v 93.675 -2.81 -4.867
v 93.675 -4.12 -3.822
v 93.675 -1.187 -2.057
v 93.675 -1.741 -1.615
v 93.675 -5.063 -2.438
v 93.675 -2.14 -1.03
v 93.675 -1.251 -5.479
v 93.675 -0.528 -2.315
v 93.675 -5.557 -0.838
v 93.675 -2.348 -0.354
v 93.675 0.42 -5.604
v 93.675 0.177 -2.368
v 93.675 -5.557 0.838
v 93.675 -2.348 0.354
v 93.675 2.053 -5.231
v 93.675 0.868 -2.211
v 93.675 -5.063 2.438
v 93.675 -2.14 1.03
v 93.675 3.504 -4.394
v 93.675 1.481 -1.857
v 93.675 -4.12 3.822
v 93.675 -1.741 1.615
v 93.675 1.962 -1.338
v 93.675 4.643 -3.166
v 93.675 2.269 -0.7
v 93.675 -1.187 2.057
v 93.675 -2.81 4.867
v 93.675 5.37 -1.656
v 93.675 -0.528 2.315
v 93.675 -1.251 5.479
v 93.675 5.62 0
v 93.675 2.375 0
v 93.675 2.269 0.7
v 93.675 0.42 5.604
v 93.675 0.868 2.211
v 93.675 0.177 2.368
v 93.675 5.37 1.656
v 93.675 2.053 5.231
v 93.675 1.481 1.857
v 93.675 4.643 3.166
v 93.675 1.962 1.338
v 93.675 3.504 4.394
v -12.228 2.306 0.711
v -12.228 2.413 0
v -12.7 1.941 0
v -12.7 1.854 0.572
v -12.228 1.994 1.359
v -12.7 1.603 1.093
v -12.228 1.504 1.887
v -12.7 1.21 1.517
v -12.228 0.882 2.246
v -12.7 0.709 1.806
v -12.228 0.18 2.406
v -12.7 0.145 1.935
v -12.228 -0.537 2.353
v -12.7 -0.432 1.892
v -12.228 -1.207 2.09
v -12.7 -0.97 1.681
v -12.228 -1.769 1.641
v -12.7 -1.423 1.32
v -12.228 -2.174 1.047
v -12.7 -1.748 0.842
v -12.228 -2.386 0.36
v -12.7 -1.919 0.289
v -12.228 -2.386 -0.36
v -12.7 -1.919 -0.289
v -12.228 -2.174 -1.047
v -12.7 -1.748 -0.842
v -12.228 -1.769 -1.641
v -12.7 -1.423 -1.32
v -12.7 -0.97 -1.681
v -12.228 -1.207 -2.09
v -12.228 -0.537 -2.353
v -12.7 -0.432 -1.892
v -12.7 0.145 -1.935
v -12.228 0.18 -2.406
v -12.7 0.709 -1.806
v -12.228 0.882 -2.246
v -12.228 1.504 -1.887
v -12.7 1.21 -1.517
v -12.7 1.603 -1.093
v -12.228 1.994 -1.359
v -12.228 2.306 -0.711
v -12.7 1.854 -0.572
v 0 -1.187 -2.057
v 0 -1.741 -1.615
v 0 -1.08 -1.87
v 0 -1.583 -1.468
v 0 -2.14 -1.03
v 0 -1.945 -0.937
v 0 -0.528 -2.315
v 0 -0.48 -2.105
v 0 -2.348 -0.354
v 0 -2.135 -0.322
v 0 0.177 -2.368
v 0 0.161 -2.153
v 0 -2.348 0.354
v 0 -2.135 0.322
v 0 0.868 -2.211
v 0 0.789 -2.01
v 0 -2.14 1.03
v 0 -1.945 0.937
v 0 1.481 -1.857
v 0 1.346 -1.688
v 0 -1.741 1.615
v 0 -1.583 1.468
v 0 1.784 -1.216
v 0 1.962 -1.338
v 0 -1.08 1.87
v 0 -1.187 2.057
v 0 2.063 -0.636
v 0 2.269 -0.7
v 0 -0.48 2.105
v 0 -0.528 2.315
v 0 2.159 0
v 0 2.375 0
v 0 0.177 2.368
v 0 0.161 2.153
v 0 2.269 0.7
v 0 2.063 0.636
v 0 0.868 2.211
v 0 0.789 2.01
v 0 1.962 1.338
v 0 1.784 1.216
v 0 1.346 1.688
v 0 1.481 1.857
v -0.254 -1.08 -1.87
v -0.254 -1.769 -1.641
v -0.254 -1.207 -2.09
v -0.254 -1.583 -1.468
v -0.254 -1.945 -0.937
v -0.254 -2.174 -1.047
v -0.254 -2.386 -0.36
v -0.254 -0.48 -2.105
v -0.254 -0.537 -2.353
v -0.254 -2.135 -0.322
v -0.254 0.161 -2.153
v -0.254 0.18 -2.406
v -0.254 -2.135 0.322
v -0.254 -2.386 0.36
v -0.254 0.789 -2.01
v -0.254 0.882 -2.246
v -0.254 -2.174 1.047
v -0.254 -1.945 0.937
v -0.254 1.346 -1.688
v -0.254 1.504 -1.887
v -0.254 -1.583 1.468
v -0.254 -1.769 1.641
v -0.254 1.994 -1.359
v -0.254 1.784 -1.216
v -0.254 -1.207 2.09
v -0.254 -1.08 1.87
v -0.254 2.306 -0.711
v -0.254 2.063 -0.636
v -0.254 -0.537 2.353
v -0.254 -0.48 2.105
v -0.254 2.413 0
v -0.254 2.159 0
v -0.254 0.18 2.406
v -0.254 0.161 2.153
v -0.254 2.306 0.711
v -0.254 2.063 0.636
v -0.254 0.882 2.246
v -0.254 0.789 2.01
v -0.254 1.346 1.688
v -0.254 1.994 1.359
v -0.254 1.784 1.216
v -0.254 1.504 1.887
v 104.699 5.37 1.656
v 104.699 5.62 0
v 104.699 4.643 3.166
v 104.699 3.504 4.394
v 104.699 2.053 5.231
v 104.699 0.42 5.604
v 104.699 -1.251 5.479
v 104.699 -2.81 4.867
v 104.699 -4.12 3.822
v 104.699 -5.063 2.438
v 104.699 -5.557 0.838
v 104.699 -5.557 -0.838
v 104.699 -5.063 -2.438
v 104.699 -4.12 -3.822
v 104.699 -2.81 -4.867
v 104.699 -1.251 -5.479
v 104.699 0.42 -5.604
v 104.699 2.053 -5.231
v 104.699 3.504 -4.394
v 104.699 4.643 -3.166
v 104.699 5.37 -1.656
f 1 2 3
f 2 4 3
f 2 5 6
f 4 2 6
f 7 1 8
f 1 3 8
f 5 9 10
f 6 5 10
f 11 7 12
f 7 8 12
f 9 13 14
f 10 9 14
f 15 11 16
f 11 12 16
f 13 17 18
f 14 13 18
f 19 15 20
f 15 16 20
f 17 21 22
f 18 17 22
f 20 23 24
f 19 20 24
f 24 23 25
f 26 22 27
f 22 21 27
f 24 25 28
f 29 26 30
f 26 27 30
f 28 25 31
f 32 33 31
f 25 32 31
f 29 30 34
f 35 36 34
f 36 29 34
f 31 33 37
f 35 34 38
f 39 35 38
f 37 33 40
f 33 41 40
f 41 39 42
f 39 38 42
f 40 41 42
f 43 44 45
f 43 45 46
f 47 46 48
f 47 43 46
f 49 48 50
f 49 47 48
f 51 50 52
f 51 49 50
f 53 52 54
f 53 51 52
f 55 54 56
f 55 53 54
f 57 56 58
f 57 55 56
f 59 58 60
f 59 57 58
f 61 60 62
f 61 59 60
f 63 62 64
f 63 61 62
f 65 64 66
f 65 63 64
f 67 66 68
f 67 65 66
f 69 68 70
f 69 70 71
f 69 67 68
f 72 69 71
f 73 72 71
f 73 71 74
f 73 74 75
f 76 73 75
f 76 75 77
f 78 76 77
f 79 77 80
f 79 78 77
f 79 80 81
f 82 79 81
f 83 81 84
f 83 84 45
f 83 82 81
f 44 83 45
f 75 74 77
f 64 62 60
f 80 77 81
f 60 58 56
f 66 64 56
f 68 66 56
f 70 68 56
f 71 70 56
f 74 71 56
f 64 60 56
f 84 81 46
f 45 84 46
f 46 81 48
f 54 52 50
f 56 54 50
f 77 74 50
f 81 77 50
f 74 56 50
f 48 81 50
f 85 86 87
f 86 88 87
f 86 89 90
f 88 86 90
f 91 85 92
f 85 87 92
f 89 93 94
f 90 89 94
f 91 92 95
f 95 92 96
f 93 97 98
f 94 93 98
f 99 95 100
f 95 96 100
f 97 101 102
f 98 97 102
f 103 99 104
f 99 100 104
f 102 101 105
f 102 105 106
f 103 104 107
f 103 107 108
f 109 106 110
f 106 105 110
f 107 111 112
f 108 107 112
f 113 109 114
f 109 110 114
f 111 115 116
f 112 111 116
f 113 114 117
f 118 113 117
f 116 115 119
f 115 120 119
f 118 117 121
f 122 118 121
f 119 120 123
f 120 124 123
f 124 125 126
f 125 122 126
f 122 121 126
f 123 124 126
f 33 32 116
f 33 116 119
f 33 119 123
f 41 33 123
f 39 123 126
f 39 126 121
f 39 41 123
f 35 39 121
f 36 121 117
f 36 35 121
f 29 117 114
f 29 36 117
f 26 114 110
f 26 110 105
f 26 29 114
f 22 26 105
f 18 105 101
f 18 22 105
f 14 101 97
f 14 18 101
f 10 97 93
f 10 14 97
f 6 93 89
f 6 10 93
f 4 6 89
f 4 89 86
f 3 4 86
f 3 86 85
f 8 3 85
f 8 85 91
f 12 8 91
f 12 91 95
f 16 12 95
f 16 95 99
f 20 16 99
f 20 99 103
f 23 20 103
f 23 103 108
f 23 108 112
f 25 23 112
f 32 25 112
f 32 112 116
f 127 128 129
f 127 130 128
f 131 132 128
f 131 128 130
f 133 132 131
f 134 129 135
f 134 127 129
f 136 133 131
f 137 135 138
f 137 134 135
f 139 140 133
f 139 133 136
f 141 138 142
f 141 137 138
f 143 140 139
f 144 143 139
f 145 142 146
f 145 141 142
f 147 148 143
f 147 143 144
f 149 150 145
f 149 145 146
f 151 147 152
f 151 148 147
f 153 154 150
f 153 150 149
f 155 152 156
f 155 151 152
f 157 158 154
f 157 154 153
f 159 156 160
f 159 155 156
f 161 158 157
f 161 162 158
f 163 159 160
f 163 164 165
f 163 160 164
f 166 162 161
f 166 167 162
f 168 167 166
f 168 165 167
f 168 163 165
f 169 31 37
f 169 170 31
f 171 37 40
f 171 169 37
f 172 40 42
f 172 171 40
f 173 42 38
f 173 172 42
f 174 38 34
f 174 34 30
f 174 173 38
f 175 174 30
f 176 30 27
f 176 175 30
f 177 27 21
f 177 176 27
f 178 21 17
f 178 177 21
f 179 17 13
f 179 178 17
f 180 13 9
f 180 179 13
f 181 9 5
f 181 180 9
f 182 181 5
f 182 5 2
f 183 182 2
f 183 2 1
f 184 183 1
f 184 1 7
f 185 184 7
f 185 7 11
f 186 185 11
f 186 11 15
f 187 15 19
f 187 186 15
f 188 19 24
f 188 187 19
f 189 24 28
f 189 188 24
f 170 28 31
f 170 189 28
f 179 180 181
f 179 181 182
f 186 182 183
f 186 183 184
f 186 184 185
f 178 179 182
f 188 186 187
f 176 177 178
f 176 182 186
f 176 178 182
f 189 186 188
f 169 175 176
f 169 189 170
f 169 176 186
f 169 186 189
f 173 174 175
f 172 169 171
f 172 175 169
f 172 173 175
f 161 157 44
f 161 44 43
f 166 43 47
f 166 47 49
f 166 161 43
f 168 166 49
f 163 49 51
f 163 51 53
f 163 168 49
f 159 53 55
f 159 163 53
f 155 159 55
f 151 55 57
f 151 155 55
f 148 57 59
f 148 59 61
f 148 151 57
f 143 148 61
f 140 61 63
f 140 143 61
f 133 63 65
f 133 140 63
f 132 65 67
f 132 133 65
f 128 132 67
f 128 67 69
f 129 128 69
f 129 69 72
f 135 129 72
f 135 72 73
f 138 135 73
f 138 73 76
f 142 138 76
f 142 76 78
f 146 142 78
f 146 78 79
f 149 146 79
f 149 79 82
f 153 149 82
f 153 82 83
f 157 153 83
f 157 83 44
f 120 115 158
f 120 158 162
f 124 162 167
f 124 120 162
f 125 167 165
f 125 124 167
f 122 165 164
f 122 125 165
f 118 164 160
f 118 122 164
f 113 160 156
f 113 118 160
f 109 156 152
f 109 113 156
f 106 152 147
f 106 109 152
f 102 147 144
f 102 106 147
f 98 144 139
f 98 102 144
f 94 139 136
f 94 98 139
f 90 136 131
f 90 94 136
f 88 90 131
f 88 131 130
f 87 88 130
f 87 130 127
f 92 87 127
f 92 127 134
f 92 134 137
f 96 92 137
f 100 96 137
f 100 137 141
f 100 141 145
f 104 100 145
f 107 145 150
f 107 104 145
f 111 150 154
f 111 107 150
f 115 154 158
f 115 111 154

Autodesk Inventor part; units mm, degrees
sketch "Sketch_1" plane through (0, 0, 0) normal (0, 0, 1) x (1, 0, 0)
  line L0 (104.6988, 0) -> (0, 0)
  line L1 (0, 0) -> (0, 2.3749)
  line L2 (0, 2.3749) -> (93.6752, 2.3749)
  line L3 (93.6752, 2.3749) -> (93.6752, 5.6197)
  line L4 (93.6752, 5.6197) -> (104.6988, 5.6197)
  line L5 (104.6988, 5.6197) -> (104.6988, 0)
  line L6 (104.6988, 0) -> (0, 0)
revolve "Revolution1" add sketch "Sketch_1" angle 360 about axis through (104.6988, 0, 0) along (1, 0, 0)
sketch "Sketch_3" plane through (0, 0, 0) normal (0, 0, 1) x (1, 0, 0)
  line L0 (0, 0) -> (-12.7, 0)
  line L1 (-12.7, 0) -> (-12.7, 1.9406)
  line L2 (-12.7, 1.9406) -> (-12.2276, 2.413)
  line L3 (-12.2276, 2.413) -> (0, 2.413)
  line L4 (0, 2.413) -> (0, 0)
  line L5 (0, 0) -> (-12.7, 0)
revolve "Revolution2" add sketch "Sketch_3" angle 360 about axis through (0, 0, 0) along (1, 0, 0)
thread "Thread1" size "10-32 UNF" class "2A" standard "ANSI Unified Screw Threads" full length
sketch "Sketch_30" plane through (0, 0, 0) normal (0, 0, 1) x (1, 0, 0)
  line L0 (0, 0) -> (-0.254, 0)
  line L1 (-0.254, 2.667) -> (-0.254, 2.159)
  line L2 (-0.254, 2.159) -> (0, 2.159)
  line L3 (0, 2.159) -> (0, 2.667)
  line L4 (0, 2.667) -> (-0.254, 2.667)
revolve "Revolution3" cut sketch "Sketch_30" angle 360 about axis through (0, 0, 0) along (1, 0, 0)
ref_plane "dia1_XY" through (0, 2.3749, 0) normal (1, 0, 0) x (0, 0, -1)
ref_plane "dia1_YZ" through (0, 2.3749, 0) normal (0, 0, -1) x (0, 1, 0)
ref_plane "dia1_ZX" through (0, 2.3749, 0) normal (0, 1, 0) x (1, 0, 0)
ref_plane "dia12_XY" through (0, 0, 9.3726) normal (1, 0, 0) x (0, 0, -1)
ref_plane "dia12_YZ" through (0, 0, 9.3726) normal (0, 0, -1) x (0, 1, 0)
ref_plane "dia12_ZX" through (0, 0, 9.3726) normal (0, 1, 0) x (1, 0, 0)
ref_plane "dia2_XY" through (0, -2.3749, 0) normal (1, 0, 0) x (0, 0, -1)
ref_plane "dia2_YZ" through (0, -2.3749, 0) normal (0, 0, -1) x (0, 1, 0)
ref_plane "dia2_ZX" through (0, -2.3749, 0) normal (0, 1, 0) x (1, 0, 0)
ref_plane "dia22_XY" through (0, 0, -9.3726) normal (1, 0, 0) x (0, 0, -1)
ref_plane "dia22_YZ" through (0, 0, -9.3726) normal (0, 0, -1) x (0, 1, 0)
ref_plane "dia22_ZX" through (0, 0, -9.3726) normal (0, 1, 0) x (1, 0, 0)
ref_plane "rl1_XY" through (-12.7, 0, 0) normal (1, 0, 0) x (0, 0, -1)
ref_plane "rl1_YZ" through (-12.7, 0, 0) normal (0, 0, -1) x (0, 1, 0)
ref_plane "rl1_ZX" through (-12.7, 0, 0) normal (0, 1, 0) x (1, 0, 0)
ref_plane "rl2_XY" through (0, 0, 0) normal (1, 0, 0) x (0, 0, -1)
ref_plane "rl2_YZ" through (0, 0, 0) normal (0, 0, -1) x (0, 1, 0)
ref_plane "rl2_ZX" through (0, 0, 0) normal (0, 1, 0) x (1, 0, 0)
ref_plane "rod_cp_XY" through (0, 0, 0) normal (1, 0, 0) x (0, 0, -1)
ref_plane "rod_cp_YZ" through (0, 0, 0) normal (0, 0, -1) x (0, 1, 0)
ref_plane "rod_cp_ZX" through (0, 0, 0) normal (0, 1, 0) x (1, 0, 0)
ref_plane "thd1_XY" through (-12.7, 2.413, 0) normal (1, 0, 0) x (0, 0, -1)
ref_plane "thd1_YZ" through (-12.7, 2.413, 0) normal (0, 0, -1) x (0, 1, 0)
ref_plane "thd1_ZX" through (-12.7, 2.413, 0) normal (0, 1, 0) x (1, 0, 0)
ref_plane "thd2_XY" through (-12.7, -2.413, 0) normal (1, 0, 0) x (0, 0, -1)
ref_plane "thd2_YZ" through (-12.7, -2.413, 0) normal (0, 0, -1) x (0, 1, 0)
ref_plane "thd2_ZX" through (-12.7, -2.413, 0) normal (0, 1, 0) x (1, 0, 0)
ref_plane "to_rod_clevis_XY" through (-12.7, 0, 0) normal (1, 0, 0) x (0, 0, -1)
ref_plane "to_rod_clevis_YZ" through (-12.7, 0, 0) normal (0, 0, -1) x (0, 1, 0)
ref_plane "to_rod_clevis_ZX" through (-12.7, 0, 0) normal (0, 1, 0) x (1, 0, 0)
properties part number "012.5-DP0_rod"
